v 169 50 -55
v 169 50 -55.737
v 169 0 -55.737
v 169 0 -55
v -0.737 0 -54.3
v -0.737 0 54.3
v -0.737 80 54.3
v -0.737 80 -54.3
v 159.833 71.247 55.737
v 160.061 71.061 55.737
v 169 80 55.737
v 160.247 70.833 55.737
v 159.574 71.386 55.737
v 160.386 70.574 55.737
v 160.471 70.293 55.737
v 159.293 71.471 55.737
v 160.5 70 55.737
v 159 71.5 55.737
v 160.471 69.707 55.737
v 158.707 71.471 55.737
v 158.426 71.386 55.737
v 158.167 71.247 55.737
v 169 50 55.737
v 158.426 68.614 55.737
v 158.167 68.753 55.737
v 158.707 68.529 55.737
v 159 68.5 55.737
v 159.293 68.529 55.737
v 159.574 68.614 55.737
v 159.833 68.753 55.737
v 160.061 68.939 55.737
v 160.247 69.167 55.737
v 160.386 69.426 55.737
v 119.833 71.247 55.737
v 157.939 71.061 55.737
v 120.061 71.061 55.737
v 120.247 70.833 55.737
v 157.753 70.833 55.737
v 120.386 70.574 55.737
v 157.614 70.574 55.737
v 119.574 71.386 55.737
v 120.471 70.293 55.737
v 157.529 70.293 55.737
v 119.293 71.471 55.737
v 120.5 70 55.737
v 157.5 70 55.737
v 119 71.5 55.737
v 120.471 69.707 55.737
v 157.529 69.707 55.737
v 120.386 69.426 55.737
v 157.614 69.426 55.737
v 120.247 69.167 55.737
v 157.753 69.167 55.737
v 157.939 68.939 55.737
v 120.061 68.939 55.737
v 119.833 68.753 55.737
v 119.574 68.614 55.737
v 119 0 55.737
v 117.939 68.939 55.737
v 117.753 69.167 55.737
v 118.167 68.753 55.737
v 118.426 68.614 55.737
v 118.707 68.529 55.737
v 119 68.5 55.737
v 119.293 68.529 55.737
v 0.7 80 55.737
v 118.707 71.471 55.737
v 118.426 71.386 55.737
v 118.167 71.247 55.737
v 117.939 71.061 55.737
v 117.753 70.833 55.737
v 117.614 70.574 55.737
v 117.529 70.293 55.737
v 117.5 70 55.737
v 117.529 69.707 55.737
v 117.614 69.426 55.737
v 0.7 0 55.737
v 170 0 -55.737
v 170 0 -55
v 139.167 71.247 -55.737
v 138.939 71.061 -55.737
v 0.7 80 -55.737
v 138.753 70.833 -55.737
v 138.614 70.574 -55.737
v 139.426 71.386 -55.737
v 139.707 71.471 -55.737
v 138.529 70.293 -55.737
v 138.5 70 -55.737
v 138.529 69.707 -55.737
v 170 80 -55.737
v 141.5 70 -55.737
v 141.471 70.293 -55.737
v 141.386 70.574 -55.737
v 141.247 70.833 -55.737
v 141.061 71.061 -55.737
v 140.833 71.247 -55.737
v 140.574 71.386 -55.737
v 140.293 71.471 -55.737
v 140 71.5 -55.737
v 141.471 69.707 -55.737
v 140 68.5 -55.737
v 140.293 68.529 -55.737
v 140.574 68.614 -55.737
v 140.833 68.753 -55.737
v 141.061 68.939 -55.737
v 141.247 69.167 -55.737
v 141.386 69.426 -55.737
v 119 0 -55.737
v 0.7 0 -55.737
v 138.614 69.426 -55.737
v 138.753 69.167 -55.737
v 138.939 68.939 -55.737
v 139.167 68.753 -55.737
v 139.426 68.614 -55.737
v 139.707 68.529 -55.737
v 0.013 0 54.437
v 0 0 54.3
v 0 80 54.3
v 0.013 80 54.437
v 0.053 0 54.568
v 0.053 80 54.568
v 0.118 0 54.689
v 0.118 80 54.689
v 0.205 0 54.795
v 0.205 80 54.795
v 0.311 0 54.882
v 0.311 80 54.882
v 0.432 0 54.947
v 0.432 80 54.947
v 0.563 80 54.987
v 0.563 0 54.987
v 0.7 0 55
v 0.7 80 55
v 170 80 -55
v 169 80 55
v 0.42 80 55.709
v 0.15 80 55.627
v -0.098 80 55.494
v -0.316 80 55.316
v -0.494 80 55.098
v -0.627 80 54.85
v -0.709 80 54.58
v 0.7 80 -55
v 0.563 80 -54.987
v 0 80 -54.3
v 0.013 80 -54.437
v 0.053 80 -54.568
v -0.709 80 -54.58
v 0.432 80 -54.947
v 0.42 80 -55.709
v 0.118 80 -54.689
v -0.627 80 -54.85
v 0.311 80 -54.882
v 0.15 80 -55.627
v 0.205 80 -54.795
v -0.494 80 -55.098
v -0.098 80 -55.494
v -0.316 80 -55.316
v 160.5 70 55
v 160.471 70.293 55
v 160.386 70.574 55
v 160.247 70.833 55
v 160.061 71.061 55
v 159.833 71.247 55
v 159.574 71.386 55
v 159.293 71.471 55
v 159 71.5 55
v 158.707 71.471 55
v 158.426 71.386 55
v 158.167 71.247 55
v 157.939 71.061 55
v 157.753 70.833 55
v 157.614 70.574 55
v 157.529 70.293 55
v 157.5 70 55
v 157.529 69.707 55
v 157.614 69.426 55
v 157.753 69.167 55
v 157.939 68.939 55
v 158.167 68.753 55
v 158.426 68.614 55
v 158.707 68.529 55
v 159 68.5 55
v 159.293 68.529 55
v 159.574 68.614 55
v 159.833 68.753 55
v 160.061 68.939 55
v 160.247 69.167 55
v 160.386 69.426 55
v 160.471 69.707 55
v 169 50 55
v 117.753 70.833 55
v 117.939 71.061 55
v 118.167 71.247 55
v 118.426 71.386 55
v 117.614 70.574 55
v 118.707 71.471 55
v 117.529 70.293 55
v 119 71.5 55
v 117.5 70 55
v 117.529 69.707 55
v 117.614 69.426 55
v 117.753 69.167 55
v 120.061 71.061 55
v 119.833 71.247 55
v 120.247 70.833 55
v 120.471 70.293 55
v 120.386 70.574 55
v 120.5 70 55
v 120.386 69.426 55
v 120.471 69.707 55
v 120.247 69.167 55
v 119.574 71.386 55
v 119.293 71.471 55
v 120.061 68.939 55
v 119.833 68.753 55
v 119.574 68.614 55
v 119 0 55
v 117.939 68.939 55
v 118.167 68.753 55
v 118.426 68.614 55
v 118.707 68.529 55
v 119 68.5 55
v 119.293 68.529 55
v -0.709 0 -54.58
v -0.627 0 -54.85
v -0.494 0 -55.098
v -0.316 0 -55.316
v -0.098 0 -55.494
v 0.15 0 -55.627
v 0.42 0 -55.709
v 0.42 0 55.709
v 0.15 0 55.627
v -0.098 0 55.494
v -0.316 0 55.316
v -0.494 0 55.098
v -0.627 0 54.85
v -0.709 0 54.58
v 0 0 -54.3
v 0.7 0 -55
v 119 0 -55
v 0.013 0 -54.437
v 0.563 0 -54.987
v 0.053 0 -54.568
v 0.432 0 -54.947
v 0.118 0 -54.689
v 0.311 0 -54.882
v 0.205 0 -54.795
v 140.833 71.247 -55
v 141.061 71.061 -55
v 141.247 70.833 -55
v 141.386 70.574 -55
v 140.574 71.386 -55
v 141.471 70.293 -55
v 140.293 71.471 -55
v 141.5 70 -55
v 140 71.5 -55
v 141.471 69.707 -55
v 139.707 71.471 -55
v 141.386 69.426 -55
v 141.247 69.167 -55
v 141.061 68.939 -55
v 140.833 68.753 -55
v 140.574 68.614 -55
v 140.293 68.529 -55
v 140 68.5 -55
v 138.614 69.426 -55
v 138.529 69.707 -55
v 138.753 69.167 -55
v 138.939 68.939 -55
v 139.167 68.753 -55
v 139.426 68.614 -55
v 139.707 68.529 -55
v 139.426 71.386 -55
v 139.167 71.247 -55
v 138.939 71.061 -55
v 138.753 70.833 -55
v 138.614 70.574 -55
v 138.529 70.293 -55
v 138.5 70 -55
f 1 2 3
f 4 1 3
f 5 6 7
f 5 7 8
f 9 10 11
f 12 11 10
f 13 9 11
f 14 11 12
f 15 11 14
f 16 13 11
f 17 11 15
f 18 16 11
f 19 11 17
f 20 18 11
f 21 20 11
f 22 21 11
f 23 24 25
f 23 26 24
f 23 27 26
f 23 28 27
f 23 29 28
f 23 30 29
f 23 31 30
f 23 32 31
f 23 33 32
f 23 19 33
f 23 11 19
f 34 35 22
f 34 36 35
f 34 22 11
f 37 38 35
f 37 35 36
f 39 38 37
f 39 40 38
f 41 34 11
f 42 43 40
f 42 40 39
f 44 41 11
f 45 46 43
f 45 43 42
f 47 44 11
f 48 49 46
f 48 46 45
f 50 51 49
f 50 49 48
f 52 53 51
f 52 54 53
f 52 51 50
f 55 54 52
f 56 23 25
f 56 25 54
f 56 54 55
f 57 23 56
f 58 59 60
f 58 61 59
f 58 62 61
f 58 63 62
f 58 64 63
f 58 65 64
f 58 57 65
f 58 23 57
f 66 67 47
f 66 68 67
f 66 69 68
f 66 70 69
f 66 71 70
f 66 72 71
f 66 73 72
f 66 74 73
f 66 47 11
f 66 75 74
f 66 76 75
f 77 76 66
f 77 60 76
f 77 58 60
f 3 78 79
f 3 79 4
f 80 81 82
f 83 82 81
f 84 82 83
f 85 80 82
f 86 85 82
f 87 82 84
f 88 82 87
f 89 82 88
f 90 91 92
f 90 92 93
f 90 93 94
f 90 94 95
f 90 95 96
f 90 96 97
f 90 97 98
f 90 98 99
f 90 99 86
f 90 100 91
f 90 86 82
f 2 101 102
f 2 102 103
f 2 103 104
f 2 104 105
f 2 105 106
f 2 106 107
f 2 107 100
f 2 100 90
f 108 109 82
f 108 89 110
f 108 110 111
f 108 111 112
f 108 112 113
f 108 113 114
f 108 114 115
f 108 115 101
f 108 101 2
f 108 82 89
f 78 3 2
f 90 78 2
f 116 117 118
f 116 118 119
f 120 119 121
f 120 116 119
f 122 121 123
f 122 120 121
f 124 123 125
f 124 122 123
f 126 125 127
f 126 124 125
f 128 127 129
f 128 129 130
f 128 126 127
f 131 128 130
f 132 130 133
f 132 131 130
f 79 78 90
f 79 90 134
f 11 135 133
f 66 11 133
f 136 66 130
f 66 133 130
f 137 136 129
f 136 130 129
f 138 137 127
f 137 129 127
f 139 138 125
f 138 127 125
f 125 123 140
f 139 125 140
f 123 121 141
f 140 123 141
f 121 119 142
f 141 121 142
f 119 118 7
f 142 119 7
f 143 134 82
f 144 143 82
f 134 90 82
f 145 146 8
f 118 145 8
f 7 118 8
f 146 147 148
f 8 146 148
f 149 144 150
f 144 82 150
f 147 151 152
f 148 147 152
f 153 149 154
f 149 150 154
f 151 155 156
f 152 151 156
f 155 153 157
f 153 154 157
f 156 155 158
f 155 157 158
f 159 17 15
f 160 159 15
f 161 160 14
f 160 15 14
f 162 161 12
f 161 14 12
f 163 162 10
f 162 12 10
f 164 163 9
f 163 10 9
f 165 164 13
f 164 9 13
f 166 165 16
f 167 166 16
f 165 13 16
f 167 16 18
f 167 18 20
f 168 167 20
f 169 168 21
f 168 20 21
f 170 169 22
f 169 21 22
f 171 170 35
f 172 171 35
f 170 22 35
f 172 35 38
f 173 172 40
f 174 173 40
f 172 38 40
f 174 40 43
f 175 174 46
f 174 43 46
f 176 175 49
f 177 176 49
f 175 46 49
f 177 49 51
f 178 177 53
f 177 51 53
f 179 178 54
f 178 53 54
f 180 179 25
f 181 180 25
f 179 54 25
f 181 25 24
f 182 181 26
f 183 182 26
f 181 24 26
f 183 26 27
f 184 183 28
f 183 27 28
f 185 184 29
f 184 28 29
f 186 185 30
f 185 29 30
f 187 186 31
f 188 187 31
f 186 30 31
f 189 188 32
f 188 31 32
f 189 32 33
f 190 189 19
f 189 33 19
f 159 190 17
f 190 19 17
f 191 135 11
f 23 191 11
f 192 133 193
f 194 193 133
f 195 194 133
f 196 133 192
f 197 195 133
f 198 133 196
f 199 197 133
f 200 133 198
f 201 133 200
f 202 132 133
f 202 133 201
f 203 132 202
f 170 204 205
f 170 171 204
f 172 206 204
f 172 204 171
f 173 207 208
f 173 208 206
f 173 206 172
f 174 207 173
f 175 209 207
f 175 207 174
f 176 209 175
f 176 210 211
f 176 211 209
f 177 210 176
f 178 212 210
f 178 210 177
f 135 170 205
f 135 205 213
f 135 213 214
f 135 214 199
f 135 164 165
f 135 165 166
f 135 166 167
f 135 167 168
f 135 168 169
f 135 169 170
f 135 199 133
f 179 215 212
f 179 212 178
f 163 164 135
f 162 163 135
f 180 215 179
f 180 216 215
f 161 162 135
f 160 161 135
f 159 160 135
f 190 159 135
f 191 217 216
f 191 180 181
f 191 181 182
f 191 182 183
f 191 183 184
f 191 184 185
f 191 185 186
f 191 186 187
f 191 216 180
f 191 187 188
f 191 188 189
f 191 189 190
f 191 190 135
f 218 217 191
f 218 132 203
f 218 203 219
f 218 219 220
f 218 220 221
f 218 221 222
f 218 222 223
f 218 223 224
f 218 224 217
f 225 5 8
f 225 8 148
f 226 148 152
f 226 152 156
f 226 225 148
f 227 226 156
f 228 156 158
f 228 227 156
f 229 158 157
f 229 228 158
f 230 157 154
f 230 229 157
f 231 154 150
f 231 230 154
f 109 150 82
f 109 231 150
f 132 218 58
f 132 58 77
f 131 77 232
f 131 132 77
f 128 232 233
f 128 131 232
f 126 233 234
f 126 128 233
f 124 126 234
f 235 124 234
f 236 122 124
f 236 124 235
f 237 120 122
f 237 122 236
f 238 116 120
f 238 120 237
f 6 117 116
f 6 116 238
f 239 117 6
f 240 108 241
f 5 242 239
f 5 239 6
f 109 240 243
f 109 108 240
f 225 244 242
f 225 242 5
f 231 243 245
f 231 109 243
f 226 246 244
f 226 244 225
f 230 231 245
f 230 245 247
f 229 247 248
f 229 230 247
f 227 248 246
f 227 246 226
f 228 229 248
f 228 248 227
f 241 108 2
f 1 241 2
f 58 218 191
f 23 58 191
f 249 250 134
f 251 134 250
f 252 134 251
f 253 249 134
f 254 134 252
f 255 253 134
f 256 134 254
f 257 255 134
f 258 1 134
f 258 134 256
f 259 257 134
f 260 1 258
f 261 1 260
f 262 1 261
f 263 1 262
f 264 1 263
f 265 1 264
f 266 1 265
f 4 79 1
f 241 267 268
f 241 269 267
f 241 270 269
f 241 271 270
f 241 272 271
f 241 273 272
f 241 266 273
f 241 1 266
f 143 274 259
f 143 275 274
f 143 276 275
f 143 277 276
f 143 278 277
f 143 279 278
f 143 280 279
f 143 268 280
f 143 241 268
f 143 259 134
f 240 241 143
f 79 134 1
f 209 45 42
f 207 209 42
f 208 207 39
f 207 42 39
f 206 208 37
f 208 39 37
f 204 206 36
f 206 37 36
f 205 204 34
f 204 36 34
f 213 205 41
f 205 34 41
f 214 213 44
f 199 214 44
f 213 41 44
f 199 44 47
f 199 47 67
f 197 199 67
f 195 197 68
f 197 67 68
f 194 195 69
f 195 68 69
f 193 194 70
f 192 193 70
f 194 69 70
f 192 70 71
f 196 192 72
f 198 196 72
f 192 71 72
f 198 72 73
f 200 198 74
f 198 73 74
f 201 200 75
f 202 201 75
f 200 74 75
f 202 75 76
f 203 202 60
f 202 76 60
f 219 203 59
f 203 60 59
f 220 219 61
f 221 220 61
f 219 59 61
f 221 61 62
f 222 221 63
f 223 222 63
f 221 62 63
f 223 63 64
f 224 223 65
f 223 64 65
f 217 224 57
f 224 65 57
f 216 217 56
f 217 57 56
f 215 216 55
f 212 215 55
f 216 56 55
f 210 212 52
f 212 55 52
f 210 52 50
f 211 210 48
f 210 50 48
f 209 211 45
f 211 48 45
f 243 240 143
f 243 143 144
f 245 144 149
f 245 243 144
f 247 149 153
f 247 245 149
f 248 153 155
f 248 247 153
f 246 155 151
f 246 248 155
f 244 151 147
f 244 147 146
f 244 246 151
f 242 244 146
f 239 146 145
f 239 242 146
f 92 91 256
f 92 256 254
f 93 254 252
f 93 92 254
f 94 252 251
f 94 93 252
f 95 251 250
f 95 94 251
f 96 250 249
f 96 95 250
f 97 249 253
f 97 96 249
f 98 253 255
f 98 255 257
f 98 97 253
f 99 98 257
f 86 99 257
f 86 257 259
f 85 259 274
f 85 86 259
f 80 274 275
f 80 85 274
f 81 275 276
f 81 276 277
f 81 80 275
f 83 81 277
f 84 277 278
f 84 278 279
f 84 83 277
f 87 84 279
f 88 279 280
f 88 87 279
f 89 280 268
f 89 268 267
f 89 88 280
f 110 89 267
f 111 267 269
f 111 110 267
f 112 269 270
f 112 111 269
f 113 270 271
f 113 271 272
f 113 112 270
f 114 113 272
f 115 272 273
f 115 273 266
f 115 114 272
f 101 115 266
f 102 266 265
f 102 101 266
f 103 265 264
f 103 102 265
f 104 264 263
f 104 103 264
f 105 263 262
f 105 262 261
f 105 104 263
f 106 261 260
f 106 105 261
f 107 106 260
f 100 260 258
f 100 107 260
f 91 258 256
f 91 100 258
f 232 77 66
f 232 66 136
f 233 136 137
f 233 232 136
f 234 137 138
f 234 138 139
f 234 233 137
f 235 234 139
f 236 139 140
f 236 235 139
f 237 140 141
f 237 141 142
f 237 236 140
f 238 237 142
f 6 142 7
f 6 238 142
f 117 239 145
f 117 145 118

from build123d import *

# Parameters (mm, degrees)
BASE_FLANGE1_DEPTH      = 80
CUT_EXTRUDE1_DEPTH      = 219.463439317
CUT_EXTRUDE1_DEPTH_BACK = 219.463439317
SKETCH7_R               = 1.5
CUT_EXTRUDE3_DEPTH      = 0.7366
SKETCH8_R               = 1.5
CUT_EXTRUDE4_DEPTH      = 0.7366


# Sheet-metal steps are written as plain solids
with BuildPart() as part:
    # Sketch1 → Base-Flange1 (new body)
    with BuildSketch(Plane(origin=(0, 0, 0), x_dir=(1, 0, 0), z_dir=(0, 1, 0))):
        with BuildLine():
            Line((170, 55), (0.7, 55))
            ThreePointArc((0.7, 55), (0.205025253, 54.794974747), (0, 54.3))
            Line((0, 54.3), (0, 0))
            Line((0, 0), (0, -54.3))
            ThreePointArc((0, -54.3), (0.205025253, -54.794974747), (0.7, -55))
            Line((0.7, -55), (169, -55))
            Line((169, -55), (169, -55.7366))
            Line((169, -55.7366), (0.7, -55.7366))
            ThreePointArc((0.7, -55.7366), (-0.315829602, -55.315829602), (-0.7366, -54.3))
            Line((-0.7366, -54.3), (-0.7366, 0))
            Line((-0.7366, 0), (-0.7366, 54.3))
            ThreePointArc((-0.7366, 54.3), (-0.315829602, 55.315829602), (0.7, 55.7366))
            Line((0.7, 55.7366), (170, 55.7366))
            Line((170, 55.7366), (170, 55))
        make_face()
    extrude(amount=BASE_FLANGE1_DEPTH)

    # Sketch6 → Cut-Extrude1 (cut, two sides: drawn at the far end of the back side and taken through both)
    with BuildSketch(Plane.XY.offset(55.7366).offset(-CUT_EXTRUDE1_DEPTH_BACK)):
        Polygon((169, 50), (169, 0), (119, 0), align=None)
    extrude(amount=CUT_EXTRUDE1_DEPTH + CUT_EXTRUDE1_DEPTH_BACK, mode=Mode.SUBTRACT)

    # Sketch7 → Cut-Extrude3 (cut)
    with BuildSketch(Plane.XY.offset(55.7366)):
        with Locations((159, 70)):
            Circle(SKETCH7_R)
        with Locations((119, 70)):
            Circle(SKETCH7_R)
    extrude(amount=-CUT_EXTRUDE3_DEPTH, mode=Mode.SUBTRACT)

    # Sketch8 → Cut-Extrude4 (cut)
    with BuildSketch(Plane.XY.offset(-55.7366)):
        with Locations((140, 70)):
            Circle(SKETCH8_R)
    extrude(amount=CUT_EXTRUDE4_DEPTH, mode=Mode.SUBTRACT)


solid = part.part
